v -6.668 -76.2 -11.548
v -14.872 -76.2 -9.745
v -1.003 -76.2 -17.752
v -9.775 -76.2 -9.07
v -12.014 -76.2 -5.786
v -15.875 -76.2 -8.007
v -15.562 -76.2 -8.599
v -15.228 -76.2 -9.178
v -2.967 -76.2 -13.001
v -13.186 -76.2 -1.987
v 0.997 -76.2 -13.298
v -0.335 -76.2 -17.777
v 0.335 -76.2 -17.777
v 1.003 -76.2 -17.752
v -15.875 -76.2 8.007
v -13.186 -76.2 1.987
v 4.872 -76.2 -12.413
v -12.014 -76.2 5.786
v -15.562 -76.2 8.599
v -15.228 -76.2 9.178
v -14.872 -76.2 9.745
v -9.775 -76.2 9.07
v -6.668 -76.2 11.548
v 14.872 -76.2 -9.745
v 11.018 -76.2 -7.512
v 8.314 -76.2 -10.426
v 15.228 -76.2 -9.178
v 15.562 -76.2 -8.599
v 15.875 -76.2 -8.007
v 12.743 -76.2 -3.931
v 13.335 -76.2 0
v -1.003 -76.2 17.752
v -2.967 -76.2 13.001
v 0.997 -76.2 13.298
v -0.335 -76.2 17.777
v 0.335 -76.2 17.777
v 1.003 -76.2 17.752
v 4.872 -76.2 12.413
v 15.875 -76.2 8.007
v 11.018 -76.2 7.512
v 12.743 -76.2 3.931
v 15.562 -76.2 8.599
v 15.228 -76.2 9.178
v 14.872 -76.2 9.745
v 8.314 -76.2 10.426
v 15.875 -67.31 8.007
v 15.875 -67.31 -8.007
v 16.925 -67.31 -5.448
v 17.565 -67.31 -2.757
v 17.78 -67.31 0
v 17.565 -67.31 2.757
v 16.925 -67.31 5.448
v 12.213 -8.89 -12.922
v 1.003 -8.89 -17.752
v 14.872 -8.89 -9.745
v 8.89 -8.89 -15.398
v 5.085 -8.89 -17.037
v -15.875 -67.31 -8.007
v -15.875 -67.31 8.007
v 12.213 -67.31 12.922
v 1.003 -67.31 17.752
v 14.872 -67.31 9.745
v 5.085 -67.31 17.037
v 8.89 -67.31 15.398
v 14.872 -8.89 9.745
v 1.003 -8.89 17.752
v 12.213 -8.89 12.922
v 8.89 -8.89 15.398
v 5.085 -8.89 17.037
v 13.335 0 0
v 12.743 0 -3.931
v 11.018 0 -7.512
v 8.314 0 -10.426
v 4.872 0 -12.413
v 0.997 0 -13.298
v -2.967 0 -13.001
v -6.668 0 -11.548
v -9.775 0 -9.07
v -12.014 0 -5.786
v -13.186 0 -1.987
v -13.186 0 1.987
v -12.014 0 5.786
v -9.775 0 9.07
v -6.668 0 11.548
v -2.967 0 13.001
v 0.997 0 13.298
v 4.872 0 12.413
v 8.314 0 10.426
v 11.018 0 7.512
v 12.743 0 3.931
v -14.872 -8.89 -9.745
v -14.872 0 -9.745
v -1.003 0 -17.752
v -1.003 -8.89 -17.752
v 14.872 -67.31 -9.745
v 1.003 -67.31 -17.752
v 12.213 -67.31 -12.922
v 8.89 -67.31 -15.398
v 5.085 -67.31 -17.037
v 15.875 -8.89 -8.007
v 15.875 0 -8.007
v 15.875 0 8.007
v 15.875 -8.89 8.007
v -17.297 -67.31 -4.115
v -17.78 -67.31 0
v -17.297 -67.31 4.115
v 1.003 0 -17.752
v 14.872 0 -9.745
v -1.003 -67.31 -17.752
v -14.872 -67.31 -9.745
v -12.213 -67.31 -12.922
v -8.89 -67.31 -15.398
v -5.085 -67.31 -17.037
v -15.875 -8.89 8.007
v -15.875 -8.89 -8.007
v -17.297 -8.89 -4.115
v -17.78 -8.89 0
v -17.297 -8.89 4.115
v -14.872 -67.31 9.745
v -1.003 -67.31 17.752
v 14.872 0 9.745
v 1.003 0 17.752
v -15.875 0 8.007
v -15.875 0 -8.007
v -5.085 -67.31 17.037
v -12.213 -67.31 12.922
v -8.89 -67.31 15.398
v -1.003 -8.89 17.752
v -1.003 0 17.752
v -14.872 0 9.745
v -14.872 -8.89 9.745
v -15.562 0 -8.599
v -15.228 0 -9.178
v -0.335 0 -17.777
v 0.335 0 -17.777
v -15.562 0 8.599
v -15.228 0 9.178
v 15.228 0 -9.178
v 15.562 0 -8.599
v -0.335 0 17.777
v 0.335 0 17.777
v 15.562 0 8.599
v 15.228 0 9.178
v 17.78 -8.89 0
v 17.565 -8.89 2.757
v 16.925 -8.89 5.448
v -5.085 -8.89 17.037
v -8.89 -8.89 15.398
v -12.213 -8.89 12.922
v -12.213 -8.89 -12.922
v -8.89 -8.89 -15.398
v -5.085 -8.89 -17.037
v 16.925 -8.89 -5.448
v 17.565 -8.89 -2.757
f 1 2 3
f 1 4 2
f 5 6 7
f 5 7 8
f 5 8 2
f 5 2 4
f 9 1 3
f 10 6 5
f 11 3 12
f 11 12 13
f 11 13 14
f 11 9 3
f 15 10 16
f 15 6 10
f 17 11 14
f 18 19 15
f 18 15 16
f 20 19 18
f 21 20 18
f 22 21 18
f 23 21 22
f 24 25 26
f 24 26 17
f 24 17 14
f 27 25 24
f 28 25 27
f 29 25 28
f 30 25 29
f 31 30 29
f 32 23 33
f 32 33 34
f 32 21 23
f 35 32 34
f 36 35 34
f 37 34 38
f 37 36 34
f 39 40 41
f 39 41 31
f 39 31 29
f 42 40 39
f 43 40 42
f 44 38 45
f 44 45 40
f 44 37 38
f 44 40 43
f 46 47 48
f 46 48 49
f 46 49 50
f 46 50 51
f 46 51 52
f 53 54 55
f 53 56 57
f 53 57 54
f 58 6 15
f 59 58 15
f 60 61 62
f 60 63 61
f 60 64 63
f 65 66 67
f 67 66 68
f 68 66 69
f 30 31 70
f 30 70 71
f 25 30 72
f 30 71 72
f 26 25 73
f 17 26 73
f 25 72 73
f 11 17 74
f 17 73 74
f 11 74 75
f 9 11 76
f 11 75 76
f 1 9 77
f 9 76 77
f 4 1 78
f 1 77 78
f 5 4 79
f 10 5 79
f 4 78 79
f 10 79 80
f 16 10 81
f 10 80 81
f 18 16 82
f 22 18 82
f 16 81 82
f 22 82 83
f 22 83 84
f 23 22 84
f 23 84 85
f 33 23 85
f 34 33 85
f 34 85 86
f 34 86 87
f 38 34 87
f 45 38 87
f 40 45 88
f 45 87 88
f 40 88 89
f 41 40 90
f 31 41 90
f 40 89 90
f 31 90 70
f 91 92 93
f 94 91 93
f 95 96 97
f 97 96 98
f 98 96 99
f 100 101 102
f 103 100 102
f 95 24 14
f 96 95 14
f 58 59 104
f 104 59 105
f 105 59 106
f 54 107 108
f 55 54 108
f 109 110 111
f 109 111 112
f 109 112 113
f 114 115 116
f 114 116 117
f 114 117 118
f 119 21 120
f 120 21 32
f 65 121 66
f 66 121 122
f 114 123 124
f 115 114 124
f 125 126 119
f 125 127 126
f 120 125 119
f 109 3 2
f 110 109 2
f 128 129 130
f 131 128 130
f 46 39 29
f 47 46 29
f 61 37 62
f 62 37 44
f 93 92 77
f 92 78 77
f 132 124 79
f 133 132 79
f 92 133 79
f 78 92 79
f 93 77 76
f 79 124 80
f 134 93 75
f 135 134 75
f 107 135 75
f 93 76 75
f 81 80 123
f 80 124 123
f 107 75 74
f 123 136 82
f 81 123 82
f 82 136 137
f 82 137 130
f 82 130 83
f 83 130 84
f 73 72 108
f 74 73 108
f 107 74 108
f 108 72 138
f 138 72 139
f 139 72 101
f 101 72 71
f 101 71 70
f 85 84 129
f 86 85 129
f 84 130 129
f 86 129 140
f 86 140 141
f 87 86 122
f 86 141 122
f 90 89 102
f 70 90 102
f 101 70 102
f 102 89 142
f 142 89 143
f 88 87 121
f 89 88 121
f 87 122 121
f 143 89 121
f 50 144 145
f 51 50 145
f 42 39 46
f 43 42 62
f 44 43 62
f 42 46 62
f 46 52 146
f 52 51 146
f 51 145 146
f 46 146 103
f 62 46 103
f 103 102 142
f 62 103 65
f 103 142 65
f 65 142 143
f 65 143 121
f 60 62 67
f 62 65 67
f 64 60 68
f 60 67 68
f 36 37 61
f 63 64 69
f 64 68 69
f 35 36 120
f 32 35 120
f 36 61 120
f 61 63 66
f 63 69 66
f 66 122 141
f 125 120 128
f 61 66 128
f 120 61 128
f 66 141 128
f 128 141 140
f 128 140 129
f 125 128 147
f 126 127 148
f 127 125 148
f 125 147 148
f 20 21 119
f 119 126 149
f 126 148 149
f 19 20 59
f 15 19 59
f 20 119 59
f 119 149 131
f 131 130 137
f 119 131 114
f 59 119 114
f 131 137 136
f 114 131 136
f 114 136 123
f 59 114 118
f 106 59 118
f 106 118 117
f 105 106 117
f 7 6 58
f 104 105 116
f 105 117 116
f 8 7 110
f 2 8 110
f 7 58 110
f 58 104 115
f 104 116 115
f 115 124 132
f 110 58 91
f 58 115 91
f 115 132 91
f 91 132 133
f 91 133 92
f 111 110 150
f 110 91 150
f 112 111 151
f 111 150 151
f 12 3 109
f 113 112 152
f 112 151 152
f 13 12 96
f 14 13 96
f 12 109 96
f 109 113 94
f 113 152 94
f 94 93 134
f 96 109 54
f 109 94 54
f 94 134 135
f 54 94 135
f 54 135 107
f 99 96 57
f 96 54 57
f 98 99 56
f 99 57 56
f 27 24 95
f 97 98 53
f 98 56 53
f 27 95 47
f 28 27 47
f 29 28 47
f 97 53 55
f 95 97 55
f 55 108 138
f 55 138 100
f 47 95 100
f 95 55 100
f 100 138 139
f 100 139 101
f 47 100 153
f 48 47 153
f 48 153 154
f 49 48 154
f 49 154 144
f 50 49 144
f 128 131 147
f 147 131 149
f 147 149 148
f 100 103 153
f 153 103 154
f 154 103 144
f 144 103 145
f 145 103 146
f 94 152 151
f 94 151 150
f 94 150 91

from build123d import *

# Parameters (mm, degrees)
CYLINDER_R          = 17.78
CYLINDER_DEPTH      = 76.2
CYLINDER_ROLL_ANGLE = 90
SKETCH_R            = 13.335
POCKET_DEPTH        = 76.2
SKETCH001_R         = 19.05
POCKET001_DEPTH     = 8.89
SKETCH002_R         = 19.05
POCKET002_DEPTH     = 8.89


with BuildPart() as part:
    # Cylinder → Cylinder (new body)
    with BuildSketch(Plane.XY):
        Circle(CYLINDER_R)
    extrude(amount=CYLINDER_DEPTH)


with BuildPart() as part_1:
    # Cylinder roll: moved
    add(part.part.rotate(Axis((0, 0, 0), (1, 0, 0)), CYLINDER_ROLL_ANGLE))


with BuildPart() as part_2:
    # Cylinder placement: moved
    add(part_1.part)

    # Sketch → Pocket (cut)
    with BuildSketch(Plane(origin=(0, 0, 0), x_dir=(1, 0, 0), z_dir=(0, 1, 0))):
        Circle(SKETCH_R)
    extrude(amount=-POCKET_DEPTH, mode=Mode.SUBTRACT)

    # Sketch001 → Pocket001 (cut)
    with BuildSketch(Plane(origin=(0, 0, 0), x_dir=(1, 0, 0), z_dir=(0, 1, 0))):
        Circle(SKETCH001_R)
        Polygon((-15.875, -9.165436), (-15.875, 9.165436), (0, 18.330871), (15.875, 9.165436), (15.875, -9.165436), (0, -18.330871), align=None, mode=Mode.SUBTRACT)
    extrude(amount=-POCKET001_DEPTH, mode=Mode.SUBTRACT)

    # Sketch002 → Pocket002 (cut)
    with BuildSketch(Plane.XZ.offset(76.2)):
        Circle(SKETCH002_R)
        Polygon((-15.875, -9.165436), (-15.875, 9.165436), (0, 18.330871), (15.875, 9.165436), (15.875, -9.165436), (0, -18.330871), align=None, mode=Mode.SUBTRACT)
    extrude(amount=-POCKET002_DEPTH, mode=Mode.SUBTRACT)


solid = part_2.part
